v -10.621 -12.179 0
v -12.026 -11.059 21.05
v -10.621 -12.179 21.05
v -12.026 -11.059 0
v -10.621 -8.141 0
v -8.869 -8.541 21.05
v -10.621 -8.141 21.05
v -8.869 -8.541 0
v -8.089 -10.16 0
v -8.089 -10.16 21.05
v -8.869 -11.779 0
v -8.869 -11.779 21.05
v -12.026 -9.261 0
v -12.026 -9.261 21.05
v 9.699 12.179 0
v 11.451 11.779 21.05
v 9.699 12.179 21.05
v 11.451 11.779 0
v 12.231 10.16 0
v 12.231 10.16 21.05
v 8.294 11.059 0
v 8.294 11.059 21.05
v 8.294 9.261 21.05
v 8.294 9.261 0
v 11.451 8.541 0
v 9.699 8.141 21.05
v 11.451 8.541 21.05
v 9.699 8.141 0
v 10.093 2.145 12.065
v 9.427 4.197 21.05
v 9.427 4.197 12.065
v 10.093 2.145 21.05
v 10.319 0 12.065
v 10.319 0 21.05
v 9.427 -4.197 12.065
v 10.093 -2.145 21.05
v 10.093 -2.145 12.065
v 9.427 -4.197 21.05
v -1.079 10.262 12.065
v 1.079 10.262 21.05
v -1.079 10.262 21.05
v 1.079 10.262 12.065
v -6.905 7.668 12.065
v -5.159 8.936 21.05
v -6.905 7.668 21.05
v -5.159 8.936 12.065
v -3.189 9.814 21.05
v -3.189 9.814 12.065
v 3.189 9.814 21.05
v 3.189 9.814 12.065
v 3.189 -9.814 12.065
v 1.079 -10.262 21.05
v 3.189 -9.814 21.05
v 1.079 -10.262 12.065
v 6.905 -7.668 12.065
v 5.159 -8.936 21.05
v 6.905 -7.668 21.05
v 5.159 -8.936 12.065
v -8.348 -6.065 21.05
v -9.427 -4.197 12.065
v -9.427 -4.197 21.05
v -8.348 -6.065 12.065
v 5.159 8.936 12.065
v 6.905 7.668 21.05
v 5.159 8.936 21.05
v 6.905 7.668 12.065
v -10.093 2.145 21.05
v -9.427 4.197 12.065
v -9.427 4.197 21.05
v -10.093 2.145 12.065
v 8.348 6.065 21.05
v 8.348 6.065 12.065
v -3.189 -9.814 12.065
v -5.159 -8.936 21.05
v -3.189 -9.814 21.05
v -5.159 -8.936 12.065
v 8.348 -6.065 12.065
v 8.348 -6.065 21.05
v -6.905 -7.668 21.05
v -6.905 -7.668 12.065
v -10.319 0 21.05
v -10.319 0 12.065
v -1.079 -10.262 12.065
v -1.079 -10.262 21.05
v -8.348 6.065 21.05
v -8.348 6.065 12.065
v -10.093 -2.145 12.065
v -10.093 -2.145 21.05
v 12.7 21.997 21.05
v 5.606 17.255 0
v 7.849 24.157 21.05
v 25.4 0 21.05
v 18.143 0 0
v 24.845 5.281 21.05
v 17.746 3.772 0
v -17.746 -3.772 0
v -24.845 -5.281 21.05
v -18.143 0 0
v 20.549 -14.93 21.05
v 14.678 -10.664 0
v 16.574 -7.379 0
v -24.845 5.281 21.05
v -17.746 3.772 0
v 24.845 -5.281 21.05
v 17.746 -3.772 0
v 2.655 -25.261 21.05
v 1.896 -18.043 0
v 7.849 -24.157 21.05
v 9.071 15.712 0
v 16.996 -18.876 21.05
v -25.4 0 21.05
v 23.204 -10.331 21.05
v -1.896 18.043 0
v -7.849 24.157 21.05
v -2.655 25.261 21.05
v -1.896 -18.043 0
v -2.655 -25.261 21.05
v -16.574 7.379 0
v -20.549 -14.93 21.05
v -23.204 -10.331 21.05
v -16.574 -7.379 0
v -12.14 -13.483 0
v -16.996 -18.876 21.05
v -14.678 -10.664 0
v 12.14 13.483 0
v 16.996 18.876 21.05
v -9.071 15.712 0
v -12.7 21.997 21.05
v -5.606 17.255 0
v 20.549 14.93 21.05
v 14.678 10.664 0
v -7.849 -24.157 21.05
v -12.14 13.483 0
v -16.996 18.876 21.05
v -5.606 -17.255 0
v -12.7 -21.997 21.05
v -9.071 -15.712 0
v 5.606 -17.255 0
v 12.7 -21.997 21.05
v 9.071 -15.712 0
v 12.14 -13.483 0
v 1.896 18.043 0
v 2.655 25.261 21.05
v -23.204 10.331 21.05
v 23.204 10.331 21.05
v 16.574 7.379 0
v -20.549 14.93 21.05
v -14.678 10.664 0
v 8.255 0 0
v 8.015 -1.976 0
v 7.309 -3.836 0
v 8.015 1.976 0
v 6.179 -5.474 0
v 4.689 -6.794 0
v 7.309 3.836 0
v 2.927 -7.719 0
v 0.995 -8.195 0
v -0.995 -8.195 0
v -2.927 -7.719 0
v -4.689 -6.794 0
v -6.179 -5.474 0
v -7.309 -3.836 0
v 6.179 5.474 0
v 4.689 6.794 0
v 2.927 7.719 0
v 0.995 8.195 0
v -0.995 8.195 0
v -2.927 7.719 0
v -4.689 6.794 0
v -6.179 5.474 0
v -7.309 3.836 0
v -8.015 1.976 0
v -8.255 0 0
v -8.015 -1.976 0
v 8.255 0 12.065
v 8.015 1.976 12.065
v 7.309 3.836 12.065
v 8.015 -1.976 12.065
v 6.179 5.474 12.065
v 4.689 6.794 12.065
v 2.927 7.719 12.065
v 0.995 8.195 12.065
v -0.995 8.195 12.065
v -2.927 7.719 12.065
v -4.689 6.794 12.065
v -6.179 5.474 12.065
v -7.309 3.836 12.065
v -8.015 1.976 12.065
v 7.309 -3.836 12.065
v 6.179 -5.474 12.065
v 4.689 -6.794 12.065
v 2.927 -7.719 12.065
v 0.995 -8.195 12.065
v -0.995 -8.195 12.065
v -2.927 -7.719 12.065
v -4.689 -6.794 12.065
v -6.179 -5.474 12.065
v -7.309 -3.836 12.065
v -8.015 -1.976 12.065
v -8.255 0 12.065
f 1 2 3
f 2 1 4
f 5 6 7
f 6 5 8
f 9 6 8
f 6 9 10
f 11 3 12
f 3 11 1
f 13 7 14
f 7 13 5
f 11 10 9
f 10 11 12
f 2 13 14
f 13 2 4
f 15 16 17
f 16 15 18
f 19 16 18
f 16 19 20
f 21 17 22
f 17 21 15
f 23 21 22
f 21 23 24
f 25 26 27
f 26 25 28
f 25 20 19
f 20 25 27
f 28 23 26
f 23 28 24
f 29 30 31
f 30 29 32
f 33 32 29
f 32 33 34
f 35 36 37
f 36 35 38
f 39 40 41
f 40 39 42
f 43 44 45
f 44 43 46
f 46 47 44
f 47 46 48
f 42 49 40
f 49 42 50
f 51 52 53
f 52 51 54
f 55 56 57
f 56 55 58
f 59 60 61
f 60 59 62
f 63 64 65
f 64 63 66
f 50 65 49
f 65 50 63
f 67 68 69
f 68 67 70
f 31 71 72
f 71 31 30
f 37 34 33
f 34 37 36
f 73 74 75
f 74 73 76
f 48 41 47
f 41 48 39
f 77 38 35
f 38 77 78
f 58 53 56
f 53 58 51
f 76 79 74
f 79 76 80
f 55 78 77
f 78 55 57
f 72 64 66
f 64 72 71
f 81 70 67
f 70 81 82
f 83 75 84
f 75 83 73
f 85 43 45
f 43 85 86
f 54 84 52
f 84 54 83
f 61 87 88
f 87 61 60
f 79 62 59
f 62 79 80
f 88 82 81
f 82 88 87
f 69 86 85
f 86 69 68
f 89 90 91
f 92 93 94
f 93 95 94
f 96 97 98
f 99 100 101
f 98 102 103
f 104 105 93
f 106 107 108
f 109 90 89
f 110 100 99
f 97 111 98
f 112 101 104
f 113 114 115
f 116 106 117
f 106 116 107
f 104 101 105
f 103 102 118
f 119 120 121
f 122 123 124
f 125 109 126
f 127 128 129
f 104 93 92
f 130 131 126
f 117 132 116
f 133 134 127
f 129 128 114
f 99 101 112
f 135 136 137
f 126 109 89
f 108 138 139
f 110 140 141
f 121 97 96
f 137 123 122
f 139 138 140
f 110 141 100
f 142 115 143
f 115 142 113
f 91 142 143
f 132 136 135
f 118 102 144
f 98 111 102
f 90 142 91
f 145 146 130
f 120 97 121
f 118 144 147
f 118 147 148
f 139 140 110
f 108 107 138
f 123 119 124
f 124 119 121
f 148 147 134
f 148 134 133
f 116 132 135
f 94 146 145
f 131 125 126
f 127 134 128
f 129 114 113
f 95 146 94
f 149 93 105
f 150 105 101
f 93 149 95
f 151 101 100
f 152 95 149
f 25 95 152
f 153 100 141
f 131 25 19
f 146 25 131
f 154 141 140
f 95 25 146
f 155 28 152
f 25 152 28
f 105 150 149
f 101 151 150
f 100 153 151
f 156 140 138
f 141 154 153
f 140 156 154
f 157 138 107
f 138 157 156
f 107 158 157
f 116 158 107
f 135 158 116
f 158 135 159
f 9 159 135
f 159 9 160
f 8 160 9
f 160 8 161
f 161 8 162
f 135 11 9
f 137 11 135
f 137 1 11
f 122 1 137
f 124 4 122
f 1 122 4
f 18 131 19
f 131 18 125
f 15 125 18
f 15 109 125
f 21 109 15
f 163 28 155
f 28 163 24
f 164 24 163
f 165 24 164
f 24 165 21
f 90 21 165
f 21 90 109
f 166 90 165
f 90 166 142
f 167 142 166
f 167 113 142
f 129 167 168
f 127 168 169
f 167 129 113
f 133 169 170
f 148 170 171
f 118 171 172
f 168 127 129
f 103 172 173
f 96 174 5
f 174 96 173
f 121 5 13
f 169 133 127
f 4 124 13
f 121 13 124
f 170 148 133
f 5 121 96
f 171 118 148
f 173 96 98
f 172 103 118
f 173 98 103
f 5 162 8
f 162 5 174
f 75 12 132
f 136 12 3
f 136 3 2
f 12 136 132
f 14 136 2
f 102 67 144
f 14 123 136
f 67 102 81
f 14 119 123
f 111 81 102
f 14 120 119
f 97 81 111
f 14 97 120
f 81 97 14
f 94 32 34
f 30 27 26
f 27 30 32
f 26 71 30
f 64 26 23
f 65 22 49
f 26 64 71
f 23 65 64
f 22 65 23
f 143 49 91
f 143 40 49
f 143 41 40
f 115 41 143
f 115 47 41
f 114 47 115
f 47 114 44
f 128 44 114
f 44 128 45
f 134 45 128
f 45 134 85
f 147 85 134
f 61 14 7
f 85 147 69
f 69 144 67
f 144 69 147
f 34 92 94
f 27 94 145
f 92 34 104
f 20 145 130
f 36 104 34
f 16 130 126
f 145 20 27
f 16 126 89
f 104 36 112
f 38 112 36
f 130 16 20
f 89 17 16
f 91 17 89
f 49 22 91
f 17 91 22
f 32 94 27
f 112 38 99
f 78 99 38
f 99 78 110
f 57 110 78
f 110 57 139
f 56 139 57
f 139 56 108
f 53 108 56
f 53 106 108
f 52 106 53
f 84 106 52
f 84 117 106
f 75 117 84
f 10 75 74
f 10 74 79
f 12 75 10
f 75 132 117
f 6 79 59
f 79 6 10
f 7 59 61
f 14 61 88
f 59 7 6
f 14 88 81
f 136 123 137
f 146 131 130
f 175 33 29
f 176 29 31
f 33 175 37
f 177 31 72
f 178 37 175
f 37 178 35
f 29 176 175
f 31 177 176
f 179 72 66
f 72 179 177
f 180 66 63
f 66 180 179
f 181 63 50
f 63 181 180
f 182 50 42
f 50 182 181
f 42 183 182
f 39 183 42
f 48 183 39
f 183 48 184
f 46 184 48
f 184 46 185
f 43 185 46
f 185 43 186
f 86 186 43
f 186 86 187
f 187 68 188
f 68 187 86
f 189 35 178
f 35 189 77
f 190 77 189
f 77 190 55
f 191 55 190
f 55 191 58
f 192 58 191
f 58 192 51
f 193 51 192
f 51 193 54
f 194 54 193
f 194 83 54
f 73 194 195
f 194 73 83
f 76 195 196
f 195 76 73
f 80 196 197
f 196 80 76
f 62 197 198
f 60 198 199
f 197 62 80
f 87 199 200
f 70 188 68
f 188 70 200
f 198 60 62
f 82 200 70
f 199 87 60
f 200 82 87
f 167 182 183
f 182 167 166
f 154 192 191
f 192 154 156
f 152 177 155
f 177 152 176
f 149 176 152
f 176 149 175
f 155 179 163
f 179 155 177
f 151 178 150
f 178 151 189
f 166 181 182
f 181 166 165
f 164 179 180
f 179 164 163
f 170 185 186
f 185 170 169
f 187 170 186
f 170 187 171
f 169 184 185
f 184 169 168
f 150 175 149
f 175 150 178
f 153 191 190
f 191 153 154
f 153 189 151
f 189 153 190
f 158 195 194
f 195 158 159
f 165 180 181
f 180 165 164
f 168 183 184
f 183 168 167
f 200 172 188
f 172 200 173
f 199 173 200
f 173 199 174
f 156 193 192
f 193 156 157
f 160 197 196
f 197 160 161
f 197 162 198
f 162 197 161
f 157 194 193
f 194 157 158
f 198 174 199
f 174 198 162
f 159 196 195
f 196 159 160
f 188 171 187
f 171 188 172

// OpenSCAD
 function mm(i) = i*25.4; 
    tubediam = mm(1.5); //diameter of the cardboard tube at the center
	 thickness= mm(.751); // thickness of material
	 boltwidth = mm(.1631); // desired diameter of bolt holes
	 bearingdiam = mm(.8125);
	 bearingheight = mm(.275);



module tubehold(tubediam=mm(2),thickness=mm(.75), boltwidth=mm(.1631),bearingdiam=mm(.8125), bearingheight = mm(.275))
    {
		union()
		{	
			difference()
			{	
			cylinder(thickness+2, (tubediam-(tubediam/(3.5)))/2, tubediam/2, 0);
				union()
					{				
					translate([-tubediam/5, -tubediam/5, -1])
						{
							cylinder(thickness+4, boltwidth/2, boltwidth/2, 0);
						}
					
					translate([tubediam/5, tubediam/5, -1])
						{
							cylinder(thickness+4, boltwidth/2, boltwidth/2, 0);
						}
					translate([0, 0, -1])
						{
							cylinder(thickness+4, bearingdiam/2, bearingdiam/2, 0);
						}
					}
				}
			difference()
				{	
					cylinder(thickness-bearingheight, bearingdiam/2, bearingdiam/2, 0);	
				translate([0, 0, -1])
					{
						cylinder(thickness-bearingheight+4, bearingdiam/2.5, bearingdiam/2.5, 0);
					}	
			}
		}
	 }

tubehold();
